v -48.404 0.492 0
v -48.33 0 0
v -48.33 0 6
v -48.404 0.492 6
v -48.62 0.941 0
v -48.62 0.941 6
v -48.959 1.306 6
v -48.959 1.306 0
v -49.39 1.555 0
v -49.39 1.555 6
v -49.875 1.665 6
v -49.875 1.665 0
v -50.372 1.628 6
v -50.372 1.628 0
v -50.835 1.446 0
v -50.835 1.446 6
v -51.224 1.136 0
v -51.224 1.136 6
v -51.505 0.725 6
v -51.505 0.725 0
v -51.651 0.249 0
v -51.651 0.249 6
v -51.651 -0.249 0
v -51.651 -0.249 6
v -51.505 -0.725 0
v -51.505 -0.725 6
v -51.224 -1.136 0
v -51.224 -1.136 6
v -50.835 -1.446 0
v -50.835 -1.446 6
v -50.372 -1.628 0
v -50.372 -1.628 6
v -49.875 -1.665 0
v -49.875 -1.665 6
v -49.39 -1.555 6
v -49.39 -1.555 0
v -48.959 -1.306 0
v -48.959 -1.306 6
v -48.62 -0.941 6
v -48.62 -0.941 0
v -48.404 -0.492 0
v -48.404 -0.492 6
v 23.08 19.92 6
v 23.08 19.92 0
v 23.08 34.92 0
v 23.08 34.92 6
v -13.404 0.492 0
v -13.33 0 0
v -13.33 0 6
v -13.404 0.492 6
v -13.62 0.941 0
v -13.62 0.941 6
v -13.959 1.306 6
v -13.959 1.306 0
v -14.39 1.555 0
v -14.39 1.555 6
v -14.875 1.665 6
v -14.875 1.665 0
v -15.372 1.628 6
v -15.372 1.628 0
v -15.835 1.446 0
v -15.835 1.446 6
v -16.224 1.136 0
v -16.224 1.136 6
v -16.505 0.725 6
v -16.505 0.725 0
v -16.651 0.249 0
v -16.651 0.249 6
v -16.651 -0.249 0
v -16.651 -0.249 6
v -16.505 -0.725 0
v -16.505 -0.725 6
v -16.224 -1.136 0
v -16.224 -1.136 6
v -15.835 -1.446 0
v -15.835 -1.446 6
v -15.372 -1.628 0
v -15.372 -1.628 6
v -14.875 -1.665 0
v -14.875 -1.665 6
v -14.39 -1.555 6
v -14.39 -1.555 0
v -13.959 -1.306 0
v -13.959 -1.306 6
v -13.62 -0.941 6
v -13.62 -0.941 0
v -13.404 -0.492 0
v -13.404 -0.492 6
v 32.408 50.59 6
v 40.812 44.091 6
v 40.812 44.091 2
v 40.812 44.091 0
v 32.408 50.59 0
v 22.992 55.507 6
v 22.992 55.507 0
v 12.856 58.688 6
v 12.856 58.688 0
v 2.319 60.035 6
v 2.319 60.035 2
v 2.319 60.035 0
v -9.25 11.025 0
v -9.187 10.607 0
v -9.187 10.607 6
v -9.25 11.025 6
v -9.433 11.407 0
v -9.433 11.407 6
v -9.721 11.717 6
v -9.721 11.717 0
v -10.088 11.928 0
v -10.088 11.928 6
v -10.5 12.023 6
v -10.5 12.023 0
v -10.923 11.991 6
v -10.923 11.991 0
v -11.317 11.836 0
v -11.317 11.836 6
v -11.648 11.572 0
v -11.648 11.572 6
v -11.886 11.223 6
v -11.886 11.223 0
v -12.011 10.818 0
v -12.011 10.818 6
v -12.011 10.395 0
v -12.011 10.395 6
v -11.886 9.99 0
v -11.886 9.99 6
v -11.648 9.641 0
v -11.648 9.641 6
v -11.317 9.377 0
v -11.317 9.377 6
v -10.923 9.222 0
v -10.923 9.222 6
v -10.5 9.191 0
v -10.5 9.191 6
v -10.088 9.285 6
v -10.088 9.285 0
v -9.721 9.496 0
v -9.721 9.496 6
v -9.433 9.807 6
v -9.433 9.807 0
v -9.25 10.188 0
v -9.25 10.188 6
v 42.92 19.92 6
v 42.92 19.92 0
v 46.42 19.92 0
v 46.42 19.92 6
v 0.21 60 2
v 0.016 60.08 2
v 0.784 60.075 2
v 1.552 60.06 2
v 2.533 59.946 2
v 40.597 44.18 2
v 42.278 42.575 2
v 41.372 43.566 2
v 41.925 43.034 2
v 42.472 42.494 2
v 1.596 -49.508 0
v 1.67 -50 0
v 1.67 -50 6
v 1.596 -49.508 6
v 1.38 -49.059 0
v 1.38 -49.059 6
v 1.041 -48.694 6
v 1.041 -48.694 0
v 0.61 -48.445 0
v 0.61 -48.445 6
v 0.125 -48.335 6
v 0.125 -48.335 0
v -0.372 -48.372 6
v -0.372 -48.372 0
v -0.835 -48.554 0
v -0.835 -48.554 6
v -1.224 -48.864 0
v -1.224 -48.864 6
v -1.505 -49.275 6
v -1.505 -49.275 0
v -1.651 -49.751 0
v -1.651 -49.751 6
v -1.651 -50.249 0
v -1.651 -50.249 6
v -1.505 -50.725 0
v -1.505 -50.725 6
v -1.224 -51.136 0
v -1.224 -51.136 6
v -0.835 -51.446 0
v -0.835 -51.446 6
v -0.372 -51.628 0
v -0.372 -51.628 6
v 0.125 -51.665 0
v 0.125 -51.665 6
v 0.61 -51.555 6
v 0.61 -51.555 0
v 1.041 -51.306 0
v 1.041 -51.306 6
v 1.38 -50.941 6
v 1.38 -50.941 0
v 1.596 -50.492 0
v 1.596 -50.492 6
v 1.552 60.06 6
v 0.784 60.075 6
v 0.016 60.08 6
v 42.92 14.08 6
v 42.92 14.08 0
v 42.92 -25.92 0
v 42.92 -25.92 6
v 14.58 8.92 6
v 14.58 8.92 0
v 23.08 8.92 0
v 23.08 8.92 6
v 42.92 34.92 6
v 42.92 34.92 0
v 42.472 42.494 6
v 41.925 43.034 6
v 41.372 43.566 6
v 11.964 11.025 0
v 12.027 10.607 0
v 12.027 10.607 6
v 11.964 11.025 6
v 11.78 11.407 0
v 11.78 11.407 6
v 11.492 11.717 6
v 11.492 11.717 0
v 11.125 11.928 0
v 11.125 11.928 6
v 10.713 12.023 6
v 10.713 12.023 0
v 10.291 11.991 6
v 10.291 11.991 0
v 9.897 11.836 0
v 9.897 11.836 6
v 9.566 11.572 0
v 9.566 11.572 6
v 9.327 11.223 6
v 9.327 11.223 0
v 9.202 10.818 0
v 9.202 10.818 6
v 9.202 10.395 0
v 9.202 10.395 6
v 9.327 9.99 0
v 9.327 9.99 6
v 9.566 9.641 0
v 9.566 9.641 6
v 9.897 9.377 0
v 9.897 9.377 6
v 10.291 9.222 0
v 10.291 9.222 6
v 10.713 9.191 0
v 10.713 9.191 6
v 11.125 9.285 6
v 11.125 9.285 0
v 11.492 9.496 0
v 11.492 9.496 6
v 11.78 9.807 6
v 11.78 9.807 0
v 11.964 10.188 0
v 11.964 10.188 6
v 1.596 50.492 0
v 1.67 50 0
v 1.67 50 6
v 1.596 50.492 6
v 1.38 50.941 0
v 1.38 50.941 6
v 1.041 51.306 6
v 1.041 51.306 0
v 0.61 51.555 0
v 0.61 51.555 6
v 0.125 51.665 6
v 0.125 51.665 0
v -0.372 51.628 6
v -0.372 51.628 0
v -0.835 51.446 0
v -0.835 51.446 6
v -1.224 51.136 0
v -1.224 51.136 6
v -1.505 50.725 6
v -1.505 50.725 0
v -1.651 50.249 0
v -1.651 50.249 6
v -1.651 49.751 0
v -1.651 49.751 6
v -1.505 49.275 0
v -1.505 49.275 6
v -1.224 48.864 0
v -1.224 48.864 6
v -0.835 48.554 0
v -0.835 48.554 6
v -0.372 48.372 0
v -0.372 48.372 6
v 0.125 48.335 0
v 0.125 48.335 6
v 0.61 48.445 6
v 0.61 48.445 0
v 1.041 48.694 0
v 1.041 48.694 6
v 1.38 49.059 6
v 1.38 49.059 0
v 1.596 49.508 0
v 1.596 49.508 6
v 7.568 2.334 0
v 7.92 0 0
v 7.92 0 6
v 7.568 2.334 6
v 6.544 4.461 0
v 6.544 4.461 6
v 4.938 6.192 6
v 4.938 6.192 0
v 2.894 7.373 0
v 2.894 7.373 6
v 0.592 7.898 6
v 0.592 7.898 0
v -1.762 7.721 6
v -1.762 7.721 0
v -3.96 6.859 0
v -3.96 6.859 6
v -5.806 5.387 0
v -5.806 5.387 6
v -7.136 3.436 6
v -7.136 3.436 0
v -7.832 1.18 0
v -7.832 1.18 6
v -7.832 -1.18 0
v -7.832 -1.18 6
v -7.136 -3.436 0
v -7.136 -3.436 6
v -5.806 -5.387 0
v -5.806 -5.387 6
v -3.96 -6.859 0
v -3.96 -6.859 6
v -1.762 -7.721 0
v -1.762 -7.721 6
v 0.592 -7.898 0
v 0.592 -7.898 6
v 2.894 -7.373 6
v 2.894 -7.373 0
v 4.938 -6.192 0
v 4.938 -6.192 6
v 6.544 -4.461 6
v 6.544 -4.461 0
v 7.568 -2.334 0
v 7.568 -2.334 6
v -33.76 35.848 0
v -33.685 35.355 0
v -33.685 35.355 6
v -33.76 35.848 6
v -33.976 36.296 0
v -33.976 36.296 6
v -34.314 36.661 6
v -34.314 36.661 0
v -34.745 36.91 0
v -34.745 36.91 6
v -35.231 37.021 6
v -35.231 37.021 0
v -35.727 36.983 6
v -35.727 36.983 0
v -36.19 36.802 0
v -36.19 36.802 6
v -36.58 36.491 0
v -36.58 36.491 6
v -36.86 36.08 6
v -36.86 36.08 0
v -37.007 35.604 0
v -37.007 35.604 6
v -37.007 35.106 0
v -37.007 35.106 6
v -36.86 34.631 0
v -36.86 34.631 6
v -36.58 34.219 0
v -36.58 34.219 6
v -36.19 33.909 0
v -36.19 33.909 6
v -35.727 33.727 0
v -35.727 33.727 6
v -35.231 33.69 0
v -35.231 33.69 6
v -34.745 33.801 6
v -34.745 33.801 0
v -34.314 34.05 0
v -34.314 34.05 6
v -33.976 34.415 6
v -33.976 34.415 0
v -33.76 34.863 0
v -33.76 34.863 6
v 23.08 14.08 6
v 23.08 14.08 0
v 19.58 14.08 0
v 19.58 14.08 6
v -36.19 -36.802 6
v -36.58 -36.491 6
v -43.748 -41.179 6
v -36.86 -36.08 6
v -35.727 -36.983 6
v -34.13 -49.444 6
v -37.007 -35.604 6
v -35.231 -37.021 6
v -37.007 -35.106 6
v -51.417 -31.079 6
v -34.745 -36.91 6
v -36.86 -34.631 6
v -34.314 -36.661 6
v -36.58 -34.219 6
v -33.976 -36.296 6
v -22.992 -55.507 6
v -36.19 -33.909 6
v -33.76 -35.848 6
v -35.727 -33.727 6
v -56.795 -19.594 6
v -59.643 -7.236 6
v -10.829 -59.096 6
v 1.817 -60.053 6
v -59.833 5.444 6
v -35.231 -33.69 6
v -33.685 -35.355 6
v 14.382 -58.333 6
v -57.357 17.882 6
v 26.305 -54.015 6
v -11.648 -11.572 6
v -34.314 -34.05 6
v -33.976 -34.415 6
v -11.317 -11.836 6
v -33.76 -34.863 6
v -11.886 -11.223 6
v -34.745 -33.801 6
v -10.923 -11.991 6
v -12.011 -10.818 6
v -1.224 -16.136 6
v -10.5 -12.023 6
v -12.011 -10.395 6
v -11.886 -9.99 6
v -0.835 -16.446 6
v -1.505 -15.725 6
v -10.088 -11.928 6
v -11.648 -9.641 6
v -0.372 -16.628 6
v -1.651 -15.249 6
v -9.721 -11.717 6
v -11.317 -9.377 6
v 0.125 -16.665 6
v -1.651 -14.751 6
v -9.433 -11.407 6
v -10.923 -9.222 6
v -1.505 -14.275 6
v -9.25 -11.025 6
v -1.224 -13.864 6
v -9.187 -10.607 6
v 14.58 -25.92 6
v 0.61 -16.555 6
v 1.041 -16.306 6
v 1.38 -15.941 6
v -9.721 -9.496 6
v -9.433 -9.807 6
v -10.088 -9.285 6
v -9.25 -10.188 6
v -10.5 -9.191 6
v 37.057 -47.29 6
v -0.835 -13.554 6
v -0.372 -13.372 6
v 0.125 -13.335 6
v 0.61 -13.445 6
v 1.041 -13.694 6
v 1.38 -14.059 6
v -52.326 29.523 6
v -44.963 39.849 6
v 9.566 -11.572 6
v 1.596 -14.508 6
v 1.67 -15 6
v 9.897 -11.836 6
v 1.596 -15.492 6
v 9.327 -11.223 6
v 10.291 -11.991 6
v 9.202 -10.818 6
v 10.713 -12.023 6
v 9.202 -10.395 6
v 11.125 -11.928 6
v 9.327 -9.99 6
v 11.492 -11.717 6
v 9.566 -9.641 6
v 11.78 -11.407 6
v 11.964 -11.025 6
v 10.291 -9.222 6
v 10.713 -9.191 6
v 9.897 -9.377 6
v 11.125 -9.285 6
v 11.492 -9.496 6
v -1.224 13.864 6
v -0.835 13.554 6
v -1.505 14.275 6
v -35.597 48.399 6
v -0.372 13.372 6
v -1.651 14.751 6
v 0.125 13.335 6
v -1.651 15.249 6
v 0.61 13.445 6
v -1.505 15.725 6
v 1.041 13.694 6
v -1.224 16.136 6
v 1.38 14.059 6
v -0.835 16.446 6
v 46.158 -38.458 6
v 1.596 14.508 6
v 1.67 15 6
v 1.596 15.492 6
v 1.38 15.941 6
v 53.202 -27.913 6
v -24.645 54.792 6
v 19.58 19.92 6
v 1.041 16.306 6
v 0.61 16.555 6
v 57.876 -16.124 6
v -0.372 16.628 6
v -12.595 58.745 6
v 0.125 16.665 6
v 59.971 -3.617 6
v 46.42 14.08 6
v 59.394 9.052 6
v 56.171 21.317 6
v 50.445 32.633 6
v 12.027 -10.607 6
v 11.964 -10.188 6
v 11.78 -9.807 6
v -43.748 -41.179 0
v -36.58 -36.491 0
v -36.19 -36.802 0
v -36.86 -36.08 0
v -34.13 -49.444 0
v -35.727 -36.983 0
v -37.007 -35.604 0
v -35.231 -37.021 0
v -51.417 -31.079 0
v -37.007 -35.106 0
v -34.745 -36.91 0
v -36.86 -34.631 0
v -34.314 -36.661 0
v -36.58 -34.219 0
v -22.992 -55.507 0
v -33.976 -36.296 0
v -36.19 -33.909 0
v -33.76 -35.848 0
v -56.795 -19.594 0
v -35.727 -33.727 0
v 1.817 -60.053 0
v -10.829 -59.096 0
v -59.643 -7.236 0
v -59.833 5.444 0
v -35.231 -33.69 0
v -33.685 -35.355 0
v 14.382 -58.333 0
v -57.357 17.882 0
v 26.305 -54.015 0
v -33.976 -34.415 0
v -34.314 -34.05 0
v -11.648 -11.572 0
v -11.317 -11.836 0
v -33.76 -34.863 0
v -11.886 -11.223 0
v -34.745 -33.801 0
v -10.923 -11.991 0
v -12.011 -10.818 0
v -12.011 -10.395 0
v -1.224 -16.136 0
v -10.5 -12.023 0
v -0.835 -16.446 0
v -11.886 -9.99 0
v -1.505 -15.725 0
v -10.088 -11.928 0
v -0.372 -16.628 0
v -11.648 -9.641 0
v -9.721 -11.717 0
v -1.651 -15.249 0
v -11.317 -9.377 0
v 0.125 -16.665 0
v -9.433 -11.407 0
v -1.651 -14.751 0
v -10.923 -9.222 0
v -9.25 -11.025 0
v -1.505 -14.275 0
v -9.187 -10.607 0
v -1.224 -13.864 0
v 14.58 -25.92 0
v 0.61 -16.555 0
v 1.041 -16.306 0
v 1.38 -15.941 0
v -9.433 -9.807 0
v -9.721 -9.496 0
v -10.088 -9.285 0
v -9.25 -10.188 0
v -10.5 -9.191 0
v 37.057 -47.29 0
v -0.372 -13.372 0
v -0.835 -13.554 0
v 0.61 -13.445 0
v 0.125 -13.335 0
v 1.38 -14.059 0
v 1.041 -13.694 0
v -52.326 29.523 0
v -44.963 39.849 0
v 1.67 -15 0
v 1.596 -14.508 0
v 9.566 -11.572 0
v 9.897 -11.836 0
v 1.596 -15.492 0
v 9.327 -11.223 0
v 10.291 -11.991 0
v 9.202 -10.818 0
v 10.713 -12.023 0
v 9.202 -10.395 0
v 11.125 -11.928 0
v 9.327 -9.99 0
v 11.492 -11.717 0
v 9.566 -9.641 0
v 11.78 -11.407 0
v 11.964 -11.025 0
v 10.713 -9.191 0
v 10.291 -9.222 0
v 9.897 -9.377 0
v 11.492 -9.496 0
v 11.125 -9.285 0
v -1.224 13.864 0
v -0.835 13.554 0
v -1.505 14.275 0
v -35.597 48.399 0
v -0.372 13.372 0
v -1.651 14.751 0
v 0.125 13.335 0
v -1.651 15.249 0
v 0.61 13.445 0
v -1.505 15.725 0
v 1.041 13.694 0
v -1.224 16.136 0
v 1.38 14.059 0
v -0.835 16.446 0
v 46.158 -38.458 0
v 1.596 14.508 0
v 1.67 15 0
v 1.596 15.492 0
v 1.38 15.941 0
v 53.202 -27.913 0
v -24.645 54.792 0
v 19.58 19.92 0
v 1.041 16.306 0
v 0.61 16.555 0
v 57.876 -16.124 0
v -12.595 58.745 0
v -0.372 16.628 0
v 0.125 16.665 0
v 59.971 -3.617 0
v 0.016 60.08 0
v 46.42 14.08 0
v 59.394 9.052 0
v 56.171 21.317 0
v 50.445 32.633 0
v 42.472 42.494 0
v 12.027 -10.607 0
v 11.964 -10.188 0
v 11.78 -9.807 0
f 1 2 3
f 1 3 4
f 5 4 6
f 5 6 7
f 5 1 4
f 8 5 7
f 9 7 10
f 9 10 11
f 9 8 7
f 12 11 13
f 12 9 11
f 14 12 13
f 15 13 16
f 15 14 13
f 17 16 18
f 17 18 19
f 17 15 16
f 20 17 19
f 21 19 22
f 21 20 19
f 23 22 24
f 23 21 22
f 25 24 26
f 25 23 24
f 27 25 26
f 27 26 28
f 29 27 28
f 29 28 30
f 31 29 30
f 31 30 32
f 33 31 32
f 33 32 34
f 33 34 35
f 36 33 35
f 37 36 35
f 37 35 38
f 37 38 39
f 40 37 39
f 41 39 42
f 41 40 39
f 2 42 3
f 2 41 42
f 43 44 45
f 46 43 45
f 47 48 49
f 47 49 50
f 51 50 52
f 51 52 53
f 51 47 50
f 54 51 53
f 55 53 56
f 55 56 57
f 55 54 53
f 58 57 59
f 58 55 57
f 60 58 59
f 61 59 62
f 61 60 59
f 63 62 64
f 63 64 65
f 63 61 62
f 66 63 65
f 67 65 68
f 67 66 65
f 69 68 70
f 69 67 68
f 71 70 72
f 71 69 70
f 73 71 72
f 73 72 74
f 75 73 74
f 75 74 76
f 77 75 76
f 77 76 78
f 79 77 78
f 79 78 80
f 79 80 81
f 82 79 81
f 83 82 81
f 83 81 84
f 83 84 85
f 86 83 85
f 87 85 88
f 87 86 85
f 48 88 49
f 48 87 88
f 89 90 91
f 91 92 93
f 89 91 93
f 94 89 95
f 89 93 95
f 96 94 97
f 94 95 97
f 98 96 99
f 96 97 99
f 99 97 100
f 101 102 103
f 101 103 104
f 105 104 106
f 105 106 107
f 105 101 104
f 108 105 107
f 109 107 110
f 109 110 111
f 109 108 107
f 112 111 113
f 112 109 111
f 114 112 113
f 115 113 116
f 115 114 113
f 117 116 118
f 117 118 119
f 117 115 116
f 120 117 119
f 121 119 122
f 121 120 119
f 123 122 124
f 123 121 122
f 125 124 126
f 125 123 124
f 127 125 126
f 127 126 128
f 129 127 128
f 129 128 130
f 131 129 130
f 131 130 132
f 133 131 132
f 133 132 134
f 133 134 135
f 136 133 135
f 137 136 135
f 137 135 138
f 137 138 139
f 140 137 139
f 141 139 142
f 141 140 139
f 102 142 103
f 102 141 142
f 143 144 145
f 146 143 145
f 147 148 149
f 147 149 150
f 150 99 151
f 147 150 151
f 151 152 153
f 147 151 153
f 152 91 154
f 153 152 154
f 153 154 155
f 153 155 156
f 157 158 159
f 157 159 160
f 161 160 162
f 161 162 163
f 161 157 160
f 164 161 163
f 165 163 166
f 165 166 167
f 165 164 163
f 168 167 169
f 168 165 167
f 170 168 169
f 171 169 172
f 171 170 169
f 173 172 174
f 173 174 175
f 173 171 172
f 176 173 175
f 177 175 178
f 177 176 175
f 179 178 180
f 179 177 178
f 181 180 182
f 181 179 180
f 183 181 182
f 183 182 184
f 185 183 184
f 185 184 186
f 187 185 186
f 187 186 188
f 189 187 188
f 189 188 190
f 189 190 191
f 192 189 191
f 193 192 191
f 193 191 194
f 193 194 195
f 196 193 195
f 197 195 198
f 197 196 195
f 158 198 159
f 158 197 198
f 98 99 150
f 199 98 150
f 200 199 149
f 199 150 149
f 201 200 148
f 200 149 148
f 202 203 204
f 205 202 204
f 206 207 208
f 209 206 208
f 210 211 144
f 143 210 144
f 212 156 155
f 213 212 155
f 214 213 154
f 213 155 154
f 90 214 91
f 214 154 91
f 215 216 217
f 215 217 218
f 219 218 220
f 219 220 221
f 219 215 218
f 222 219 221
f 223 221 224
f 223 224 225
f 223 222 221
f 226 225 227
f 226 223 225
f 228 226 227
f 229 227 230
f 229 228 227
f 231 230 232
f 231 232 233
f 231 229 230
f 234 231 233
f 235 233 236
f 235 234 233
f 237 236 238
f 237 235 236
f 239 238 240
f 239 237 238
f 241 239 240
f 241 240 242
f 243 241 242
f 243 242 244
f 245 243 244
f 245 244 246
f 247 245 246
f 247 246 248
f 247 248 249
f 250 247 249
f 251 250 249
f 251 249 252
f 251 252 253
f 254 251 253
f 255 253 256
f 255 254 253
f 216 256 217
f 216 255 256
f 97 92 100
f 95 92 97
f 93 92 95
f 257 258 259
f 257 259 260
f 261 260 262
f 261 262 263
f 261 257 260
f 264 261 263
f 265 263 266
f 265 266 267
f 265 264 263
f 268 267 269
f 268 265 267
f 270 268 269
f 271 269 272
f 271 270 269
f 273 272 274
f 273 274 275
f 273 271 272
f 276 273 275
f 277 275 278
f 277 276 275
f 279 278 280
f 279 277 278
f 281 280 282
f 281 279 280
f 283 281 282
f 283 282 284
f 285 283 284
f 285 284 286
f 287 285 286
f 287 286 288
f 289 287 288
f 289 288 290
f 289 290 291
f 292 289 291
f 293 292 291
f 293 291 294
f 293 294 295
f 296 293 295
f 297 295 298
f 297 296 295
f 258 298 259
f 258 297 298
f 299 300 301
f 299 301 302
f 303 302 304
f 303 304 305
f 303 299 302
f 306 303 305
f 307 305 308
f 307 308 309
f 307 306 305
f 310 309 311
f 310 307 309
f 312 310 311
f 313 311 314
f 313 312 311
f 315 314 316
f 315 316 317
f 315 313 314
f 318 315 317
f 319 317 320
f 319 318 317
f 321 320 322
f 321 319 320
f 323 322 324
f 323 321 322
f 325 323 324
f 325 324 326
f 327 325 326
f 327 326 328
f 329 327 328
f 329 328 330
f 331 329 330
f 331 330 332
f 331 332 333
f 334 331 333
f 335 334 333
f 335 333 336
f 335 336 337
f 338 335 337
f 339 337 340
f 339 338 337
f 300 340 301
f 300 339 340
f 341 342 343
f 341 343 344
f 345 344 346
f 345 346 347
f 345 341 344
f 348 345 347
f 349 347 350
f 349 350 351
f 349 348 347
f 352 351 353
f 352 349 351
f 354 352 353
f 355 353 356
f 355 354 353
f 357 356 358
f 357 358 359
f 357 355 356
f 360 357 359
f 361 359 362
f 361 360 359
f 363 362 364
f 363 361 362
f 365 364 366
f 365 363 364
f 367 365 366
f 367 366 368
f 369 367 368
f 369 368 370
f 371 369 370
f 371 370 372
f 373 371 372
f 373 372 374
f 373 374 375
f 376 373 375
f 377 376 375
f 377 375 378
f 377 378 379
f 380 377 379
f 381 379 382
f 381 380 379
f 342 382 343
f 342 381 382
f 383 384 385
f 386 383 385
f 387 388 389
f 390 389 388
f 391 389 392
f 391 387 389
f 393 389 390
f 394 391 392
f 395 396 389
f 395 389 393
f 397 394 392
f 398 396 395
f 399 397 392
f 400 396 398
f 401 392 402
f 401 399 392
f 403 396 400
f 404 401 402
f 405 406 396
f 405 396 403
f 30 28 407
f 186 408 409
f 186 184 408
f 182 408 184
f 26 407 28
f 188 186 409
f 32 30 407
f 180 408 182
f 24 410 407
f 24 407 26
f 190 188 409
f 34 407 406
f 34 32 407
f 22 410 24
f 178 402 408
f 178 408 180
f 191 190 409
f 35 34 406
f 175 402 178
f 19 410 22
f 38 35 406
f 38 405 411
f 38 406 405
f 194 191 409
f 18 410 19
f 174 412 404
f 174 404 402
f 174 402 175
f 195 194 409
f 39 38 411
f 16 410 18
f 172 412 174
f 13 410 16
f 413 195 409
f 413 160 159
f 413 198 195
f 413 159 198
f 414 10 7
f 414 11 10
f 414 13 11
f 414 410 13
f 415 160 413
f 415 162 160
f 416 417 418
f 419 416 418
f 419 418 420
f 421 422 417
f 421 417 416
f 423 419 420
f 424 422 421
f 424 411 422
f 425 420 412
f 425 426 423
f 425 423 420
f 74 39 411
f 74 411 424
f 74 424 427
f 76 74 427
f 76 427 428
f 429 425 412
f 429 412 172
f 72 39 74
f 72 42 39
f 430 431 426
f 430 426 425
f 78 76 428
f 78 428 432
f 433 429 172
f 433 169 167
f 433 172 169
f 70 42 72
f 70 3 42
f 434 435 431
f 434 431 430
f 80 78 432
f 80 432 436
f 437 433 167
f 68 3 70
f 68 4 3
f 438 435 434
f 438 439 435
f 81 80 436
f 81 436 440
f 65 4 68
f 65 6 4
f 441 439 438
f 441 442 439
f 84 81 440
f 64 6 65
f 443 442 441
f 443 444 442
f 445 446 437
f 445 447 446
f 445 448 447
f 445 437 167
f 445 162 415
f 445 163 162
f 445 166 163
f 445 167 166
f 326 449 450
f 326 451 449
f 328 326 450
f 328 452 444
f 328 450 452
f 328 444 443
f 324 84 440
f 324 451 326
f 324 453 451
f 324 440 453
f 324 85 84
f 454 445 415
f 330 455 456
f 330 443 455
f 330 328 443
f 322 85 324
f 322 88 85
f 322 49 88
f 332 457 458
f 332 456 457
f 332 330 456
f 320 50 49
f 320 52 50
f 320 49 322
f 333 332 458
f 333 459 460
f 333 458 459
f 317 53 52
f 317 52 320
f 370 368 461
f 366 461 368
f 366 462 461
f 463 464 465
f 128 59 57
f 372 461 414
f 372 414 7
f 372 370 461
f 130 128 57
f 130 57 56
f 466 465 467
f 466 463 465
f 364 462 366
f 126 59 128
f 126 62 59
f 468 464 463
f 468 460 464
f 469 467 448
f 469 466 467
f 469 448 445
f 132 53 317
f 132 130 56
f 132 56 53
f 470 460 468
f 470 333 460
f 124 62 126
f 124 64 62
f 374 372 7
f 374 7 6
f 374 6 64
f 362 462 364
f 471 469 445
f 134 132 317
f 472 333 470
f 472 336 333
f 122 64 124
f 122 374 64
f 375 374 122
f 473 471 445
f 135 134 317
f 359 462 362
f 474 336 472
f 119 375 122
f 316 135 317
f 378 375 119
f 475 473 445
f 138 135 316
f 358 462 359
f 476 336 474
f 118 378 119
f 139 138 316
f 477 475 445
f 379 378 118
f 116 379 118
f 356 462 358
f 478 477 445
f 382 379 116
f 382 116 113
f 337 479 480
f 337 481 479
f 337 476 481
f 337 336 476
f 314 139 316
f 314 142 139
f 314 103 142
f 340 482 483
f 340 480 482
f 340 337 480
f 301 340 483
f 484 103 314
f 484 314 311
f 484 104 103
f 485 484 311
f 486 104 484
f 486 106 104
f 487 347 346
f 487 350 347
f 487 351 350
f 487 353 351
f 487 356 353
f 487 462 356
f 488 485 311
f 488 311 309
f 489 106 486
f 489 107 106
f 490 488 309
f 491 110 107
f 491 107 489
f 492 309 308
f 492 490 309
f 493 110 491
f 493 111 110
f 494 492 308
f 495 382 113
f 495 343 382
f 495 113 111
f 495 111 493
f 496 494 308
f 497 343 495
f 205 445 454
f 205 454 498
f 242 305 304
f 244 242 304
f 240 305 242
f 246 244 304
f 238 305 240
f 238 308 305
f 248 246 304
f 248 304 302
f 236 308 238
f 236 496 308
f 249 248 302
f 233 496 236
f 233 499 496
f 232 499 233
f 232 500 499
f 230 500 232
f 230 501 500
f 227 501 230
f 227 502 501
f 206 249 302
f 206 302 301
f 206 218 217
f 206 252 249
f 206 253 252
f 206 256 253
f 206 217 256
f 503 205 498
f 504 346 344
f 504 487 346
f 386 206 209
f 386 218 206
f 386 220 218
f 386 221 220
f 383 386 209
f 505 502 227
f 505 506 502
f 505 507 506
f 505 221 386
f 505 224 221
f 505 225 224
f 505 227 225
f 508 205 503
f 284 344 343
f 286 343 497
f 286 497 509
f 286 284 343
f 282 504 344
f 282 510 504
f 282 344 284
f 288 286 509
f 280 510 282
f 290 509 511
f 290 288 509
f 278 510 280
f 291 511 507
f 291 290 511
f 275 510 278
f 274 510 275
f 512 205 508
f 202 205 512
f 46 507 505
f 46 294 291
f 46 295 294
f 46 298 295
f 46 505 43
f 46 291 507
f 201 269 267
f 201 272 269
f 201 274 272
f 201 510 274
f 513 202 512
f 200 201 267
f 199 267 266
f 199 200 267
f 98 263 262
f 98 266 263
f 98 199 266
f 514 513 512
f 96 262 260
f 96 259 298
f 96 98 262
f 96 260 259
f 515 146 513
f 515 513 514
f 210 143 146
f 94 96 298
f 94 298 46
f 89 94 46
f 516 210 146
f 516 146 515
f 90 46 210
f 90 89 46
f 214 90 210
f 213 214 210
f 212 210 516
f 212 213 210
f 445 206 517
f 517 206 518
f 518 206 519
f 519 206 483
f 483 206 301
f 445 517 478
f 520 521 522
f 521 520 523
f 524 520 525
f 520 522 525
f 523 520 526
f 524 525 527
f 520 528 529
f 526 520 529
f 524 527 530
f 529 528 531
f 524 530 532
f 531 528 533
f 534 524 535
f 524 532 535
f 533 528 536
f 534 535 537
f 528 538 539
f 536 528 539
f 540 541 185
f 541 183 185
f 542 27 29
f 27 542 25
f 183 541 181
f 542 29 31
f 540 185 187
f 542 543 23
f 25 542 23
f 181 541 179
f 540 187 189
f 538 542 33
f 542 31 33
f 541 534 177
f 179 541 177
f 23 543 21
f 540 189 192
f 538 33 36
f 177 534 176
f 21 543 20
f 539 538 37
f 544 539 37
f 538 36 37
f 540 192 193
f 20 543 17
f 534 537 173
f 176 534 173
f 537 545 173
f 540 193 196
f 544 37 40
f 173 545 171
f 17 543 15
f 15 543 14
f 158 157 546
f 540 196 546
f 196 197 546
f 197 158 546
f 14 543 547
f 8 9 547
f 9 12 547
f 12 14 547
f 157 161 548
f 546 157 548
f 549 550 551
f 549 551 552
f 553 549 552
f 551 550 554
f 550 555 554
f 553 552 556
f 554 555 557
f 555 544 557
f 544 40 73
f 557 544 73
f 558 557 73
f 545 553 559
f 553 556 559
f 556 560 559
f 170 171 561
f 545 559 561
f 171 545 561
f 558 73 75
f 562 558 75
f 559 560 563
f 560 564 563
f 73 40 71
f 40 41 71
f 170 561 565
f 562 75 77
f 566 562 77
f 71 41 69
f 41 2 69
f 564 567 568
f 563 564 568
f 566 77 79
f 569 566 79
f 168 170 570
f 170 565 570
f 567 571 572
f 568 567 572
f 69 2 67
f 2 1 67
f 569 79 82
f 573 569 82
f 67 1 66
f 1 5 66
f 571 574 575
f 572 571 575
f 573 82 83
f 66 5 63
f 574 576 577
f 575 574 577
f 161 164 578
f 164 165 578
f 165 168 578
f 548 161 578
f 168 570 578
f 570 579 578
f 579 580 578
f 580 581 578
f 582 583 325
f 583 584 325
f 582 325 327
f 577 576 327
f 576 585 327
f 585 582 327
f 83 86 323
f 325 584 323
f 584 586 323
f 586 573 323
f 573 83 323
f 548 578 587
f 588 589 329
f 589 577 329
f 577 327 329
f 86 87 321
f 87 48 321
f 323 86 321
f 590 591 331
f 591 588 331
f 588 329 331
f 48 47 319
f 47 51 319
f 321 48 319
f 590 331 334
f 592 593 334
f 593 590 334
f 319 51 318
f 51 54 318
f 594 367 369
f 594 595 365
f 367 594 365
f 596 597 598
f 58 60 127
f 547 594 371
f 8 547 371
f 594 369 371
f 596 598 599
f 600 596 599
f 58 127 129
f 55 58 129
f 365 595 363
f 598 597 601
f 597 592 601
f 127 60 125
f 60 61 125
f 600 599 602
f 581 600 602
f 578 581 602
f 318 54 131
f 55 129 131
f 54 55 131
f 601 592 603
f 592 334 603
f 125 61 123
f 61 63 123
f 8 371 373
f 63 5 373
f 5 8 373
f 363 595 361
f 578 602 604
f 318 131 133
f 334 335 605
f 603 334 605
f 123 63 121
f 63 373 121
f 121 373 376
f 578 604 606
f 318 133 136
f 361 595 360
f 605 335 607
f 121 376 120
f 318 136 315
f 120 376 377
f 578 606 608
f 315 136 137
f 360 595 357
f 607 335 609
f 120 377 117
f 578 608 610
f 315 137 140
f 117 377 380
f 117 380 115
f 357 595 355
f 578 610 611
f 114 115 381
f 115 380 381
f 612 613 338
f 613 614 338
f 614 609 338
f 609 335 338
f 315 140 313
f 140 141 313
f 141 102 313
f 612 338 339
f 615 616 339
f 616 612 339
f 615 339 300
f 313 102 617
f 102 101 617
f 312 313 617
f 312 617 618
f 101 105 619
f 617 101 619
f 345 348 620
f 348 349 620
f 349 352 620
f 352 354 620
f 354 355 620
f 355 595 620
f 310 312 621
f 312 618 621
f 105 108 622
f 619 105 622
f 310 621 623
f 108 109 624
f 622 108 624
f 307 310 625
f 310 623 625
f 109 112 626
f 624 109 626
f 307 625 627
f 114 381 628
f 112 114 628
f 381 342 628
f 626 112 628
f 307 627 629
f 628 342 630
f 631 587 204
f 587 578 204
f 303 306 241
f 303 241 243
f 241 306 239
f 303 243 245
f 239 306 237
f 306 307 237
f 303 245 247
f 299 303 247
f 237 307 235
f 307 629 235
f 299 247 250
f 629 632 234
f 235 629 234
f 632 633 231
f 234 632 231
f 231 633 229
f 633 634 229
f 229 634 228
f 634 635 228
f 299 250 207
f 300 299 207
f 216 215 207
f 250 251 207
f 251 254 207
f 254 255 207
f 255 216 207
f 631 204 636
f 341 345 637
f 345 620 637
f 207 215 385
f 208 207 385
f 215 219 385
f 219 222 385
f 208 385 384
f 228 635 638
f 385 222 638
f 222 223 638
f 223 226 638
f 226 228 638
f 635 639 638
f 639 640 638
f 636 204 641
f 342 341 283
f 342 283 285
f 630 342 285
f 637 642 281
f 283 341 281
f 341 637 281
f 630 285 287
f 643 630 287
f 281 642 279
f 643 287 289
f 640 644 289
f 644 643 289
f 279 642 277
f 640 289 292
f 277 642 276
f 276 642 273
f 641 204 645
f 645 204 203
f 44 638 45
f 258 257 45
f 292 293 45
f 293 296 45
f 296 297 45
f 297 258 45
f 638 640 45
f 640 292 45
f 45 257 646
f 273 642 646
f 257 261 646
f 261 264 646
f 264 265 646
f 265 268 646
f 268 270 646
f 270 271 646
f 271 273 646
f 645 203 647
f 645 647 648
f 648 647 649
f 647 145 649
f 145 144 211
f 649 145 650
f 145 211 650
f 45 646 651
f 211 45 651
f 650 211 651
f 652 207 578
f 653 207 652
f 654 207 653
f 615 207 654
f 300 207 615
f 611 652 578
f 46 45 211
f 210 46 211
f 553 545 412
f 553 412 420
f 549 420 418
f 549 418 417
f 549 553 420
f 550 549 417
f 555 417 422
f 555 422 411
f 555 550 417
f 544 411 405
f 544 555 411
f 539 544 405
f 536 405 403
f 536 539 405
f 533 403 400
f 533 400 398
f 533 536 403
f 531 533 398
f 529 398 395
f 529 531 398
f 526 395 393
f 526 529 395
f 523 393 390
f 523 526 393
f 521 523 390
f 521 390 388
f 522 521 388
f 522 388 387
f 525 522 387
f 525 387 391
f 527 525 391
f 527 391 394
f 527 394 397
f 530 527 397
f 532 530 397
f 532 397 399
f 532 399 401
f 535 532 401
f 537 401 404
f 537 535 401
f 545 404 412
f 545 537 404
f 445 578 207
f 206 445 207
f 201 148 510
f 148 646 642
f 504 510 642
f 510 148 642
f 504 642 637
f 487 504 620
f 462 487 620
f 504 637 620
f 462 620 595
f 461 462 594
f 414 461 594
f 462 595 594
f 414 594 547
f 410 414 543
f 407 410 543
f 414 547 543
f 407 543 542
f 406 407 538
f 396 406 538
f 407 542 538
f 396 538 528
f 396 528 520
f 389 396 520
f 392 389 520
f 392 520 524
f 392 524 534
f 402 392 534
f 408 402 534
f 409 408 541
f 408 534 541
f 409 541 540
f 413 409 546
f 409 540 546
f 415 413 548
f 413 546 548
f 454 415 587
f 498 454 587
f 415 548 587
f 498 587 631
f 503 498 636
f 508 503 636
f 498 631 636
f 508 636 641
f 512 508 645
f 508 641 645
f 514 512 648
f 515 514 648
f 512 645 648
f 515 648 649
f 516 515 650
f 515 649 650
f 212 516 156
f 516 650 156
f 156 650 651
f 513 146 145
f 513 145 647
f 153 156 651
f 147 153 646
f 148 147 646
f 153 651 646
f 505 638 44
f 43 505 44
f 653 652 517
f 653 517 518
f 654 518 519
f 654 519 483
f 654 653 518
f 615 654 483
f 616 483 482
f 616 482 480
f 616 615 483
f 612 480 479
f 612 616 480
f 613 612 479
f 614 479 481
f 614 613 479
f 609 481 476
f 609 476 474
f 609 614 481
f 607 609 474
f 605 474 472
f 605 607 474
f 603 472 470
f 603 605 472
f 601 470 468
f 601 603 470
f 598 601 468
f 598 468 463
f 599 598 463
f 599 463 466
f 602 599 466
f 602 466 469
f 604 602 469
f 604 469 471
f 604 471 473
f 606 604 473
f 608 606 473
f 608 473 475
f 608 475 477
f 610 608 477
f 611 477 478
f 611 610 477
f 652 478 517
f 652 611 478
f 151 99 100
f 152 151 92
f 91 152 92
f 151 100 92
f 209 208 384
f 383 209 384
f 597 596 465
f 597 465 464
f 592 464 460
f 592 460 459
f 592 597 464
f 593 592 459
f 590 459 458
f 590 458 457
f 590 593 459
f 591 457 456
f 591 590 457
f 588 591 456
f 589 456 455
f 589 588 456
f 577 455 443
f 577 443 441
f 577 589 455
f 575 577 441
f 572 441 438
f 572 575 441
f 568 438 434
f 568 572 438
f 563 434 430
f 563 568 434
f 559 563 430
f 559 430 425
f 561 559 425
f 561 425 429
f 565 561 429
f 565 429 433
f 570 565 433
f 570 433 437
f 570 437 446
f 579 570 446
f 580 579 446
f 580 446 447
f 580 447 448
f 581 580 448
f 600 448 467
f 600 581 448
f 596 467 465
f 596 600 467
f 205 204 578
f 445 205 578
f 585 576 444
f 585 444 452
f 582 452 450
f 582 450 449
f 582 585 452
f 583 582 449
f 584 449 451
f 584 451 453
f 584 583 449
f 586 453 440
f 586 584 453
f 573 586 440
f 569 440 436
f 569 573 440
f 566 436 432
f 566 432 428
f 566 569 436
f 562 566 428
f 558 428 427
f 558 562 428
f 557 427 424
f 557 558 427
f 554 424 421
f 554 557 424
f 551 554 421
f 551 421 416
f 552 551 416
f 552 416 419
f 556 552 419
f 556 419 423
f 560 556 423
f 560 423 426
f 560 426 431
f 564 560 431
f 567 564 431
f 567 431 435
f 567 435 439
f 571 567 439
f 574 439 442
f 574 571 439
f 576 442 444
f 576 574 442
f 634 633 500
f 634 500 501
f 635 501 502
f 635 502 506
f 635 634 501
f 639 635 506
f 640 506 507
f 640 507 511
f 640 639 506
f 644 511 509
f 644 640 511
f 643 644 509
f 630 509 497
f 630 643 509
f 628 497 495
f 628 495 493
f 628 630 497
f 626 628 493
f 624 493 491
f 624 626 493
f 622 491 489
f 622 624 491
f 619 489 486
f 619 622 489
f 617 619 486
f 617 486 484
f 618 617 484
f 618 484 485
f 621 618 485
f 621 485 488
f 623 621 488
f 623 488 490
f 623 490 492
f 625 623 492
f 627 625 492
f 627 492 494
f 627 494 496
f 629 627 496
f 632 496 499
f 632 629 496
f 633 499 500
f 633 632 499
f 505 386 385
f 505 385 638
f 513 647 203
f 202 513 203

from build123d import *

# Parameters (mm, degrees)
SKETCH1_R              = 60
SKETCH1_R_2            = 8
SKETCH1_R_3            = 1.75
SKETCH1_R_4            = 1.5
BOSS_EXTRUDE1_DEPTH    = 6
CUT_EXTRUDE6_DEPTH     = 86.064681273
CUT_EXTRUDE7_DEPTH     = 2
MOVE_FACE2_OUTLINE_R   = 8
MOVE_FACE2_OUTLINE_R_2 = 7.92
MOVE_FACE2_OUTLINE_R_3 = 1.75
MOVE_FACE2_OUTLINE_R_4 = 1.67
MOVE_FACE2_OUTLINE_R_5 = 1.5
MOVE_FACE2_OUTLINE_R_6 = 1.42
MOVE_FACE2_DEPTH       = 6
MOVE_START             = 2
MOVE_FACE2_2_DEPTH     = 4


# Read off the part's stored shape, not the designer's step: Move Face2
with BuildPart() as part:
    # Sketch1 → Boss-Extrude1 (new body)
    with BuildSketch(Plane.XY):
        Circle(SKETCH1_R)
        Circle(SKETCH1_R_2, mode=Mode.SUBTRACT)
        with Locations((0, -15)):
            Circle(SKETCH1_R_3, mode=Mode.SUBTRACT)
        with Locations((10.606601718, -10.606601718)):
            Circle(SKETCH1_R_4, mode=Mode.SUBTRACT)
        with Locations((0, -50)):
            Circle(SKETCH1_R_3, mode=Mode.SUBTRACT)
        with Locations((-15, 0)):
            Circle(SKETCH1_R_3, mode=Mode.SUBTRACT)
        with Locations((-10.606601718, -10.606601718)):
            Circle(SKETCH1_R_4, mode=Mode.SUBTRACT)
        with Locations((0, 15)):
            Circle(SKETCH1_R_3, mode=Mode.SUBTRACT)
        with Locations((-10.606601718, 10.606601718)):
            Circle(SKETCH1_R_4, mode=Mode.SUBTRACT)
        with Locations((10.606601718, 10.606601718)):
            Circle(SKETCH1_R_4, mode=Mode.SUBTRACT)
        with Locations((-35.355339059, -35.355339059)):
            Circle(SKETCH1_R_3, mode=Mode.SUBTRACT)
        with Locations((-35.355339059, 35.355339059)):
            Circle(SKETCH1_R_3, mode=Mode.SUBTRACT)
        with Locations((-50, 0)):
            Circle(SKETCH1_R_3, mode=Mode.SUBTRACT)
        with Locations((0, 50)):
            Circle(SKETCH1_R_3, mode=Mode.SUBTRACT)
    extrude(amount=BOSS_EXTRUDE1_DEPTH)

    # Sketch7 → Cut-Extrude6 (cut, through all)
    with BuildSketch(Plane(origin=(0, 0, 0), x_dir=(-1, 0, 0), z_dir=(0, 0, -1))):
        Polygon((-43, -26), (-23, -26), (-14.5, -26), (-14.5, 9), (-23, 9), (-23, 14), (-19.5, 14), (-19.5, 20), (-23, 20), (-23, 35), (-43, 35), (-43, 20), (-46.5, 20), (-46.5, 14), (-43, 14), align=None)
    extrude(amount=-CUT_EXTRUDE6_DEPTH, mode=Mode.SUBTRACT)

    # Sketch8 → Cut-Extrude7 (cut)
    with BuildSketch(Plane(origin=(0, 0, 0), x_dir=(-1, 0, 0), z_dir=(0, 0, -1))):
        Polygon((-42.426406871, 42.426406871), (0, 60), (-0.316144007, 60.951441065), (-42.742550878, 43.377847936), align=None)
    extrude(amount=-CUT_EXTRUDE7_DEPTH, mode=Mode.SUBTRACT)

    # Move Face2 outline → Move Face2 (add)
    # profile 1 of 16: a face of its own
    with BuildSketch(Plane.XY):
        with BuildLine():
            ThreePointArc((0.01591808, 60.079997891), (-22.991620616, -55.506682313), (42.47171814, 42.494229705))
            Line((42.47171814, 42.494229705), (0.01591808, 60.079997891))
        make_face()
        with BuildLine():
            Line((0, 60), (42.426406871, 42.426406871))
            ThreePointArc((42.426406871, 42.426406871), (-22.961005942, -55.432771951), (0, 60))
        make_face(mode=Mode.SUBTRACT)
    # profile 2 of 16: a face of its own
    with BuildSketch(Plane.XY):
        with BuildLine():
            ThreePointArc((40.811514416, 44.091118052), (22.991620617, 55.506682313), (2.319029971, 60.035227159))
            Line((2.319029971, 60.035227159), (40.811514416, 44.091118052))
        make_face()
        with BuildLine():
            ThreePointArc((2.767270729, 59.936151134), (22.961005942, 55.432771951), (40.424503007, 44.338014803))
            Line((40.424503007, 44.338014803), (2.767270729, 59.936151134))
        make_face(mode=Mode.SUBTRACT)
    # profile 3 of 16: a face of its own
    with BuildSketch(Plane.XY):
        Circle(MOVE_FACE2_OUTLINE_R)
        Circle(MOVE_FACE2_OUTLINE_R_2, mode=Mode.SUBTRACT)
    # profile 4 of 16: a face of its own
    with BuildSketch(Plane.XY):
        with Locations((0, -15)):
            Circle(MOVE_FACE2_OUTLINE_R_3)
        with Locations((0, -15)):
            Circle(MOVE_FACE2_OUTLINE_R_4, mode=Mode.SUBTRACT)
    # profile 5 of 16: a face of its own
    with BuildSketch(Plane.XY):
        with Locations((10.606601718, -10.606601718)):
            Circle(MOVE_FACE2_OUTLINE_R_5)
        with Locations((10.606601718, -10.606601718)):
            Circle(MOVE_FACE2_OUTLINE_R_6, mode=Mode.SUBTRACT)
    # profile 6 of 16: a face of its own
    with BuildSketch(Plane.XY):
        with Locations((0, -50)):
            Circle(MOVE_FACE2_OUTLINE_R_3)
        with Locations((0, -50)):
            Circle(MOVE_FACE2_OUTLINE_R_4, mode=Mode.SUBTRACT)
    # profile 7 of 16: a face of its own
    with BuildSketch(Plane.XY):
        with Locations((-35.355339059, -35.355339059)):
            Circle(MOVE_FACE2_OUTLINE_R_3)
        with Locations((-35.355339059, -35.355339059)):
            Circle(MOVE_FACE2_OUTLINE_R_4, mode=Mode.SUBTRACT)
    # profile 8 of 16: a face of its own
    with BuildSketch(Plane.XY):
        with Locations((-15, 0)):
            Circle(MOVE_FACE2_OUTLINE_R_3)
        with Locations((-15, 0)):
            Circle(MOVE_FACE2_OUTLINE_R_4, mode=Mode.SUBTRACT)
    # profile 9 of 16: a face of its own
    with BuildSketch(Plane.XY):
        with Locations((-10.606601718, -10.606601718)):
            Circle(MOVE_FACE2_OUTLINE_R_5)
        with Locations((-10.606601718, -10.606601718)):
            Circle(MOVE_FACE2_OUTLINE_R_6, mode=Mode.SUBTRACT)
    # profile 10 of 16: a face of its own
    with BuildSketch(Plane.XY):
        with Locations((0, 15)):
            Circle(MOVE_FACE2_OUTLINE_R_3)
        with Locations((0, 15)):
            Circle(MOVE_FACE2_OUTLINE_R_4, mode=Mode.SUBTRACT)
    # profile 11 of 16: a face of its own
    with BuildSketch(Plane.XY):
        with Locations((-10.606601718, 10.606601718)):
            Circle(MOVE_FACE2_OUTLINE_R_5)
        with Locations((-10.606601718, 10.606601718)):
            Circle(MOVE_FACE2_OUTLINE_R_6, mode=Mode.SUBTRACT)
    # profile 12 of 16: a face of its own
    with BuildSketch(Plane.XY):
        with Locations((10.606601718, 10.606601718)):
            Circle(MOVE_FACE2_OUTLINE_R_5)
        with Locations((10.606601718, 10.606601718)):
            Circle(MOVE_FACE2_OUTLINE_R_6, mode=Mode.SUBTRACT)
    # profile 13 of 16: a face of its own
    with BuildSketch(Plane.XY):
        with Locations((-50, 0)):
            Circle(MOVE_FACE2_OUTLINE_R_3)
        with Locations((-50, 0)):
            Circle(MOVE_FACE2_OUTLINE_R_4, mode=Mode.SUBTRACT)
    # profile 14 of 16: a face of its own
    with BuildSketch(Plane.XY):
        with Locations((-35.355339059, 35.355339059)):
            Circle(MOVE_FACE2_OUTLINE_R_3)
        with Locations((-35.355339059, 35.355339059)):
            Circle(MOVE_FACE2_OUTLINE_R_4, mode=Mode.SUBTRACT)
    # profile 15 of 16: a face of its own
    with BuildSketch(Plane.XY):
        with Locations((0, 50)):
            Circle(MOVE_FACE2_OUTLINE_R_3)
        with Locations((0, 50)):
            Circle(MOVE_FACE2_OUTLINE_R_4, mode=Mode.SUBTRACT)
    # profile 16 of 16: a face of its own
    with BuildSketch(Plane.XY):
        Polygon((14.5, -26), (43, -26), (43, 14), (46.5, 14), (46.5, 20), (43, 20), (43, 35), (23, 35), (23, 20), (19.5, 20), (19.5, 14), (23, 14), (23, 9), (14.5, 9), align=None)
        Polygon((42.92, 14.08), (42.92, -25.92), (14.58, -25.92), (14.58, 8.92), (23.08, 8.92), (23.08, 14.08), (19.58, 14.08), (19.58, 19.92), (23.08, 19.92), (23.08, 34.92), (42.92, 34.92), (42.92, 19.92), (46.42, 19.92), (46.42, 14.08), align=None, mode=Mode.SUBTRACT)
    extrude(amount=MOVE_FACE2_DEPTH)

    # Move Face2 2 outline → Move Face2 2 (add)
    with BuildSketch(Plane.XY.offset(MOVE_START)):
        with BuildLine():
            Line((42.277699454, 42.574594876), (42.47171814, 42.494229705))
            ThreePointArc((42.47171814, 42.494229705), (41.649270334, 43.300631412), (40.811514416, 44.091118052))
            Line((40.811514416, 44.091118052), (40.597304781, 44.179846588))
            ThreePointArc((40.597304781, 44.179846588), (41.44527464, 43.385357092), (42.277699454, 42.574594876))
        make_face()
        with BuildLine():
            ThreePointArc((2.319029971, 60.035227159), (1.167688616, 60.068651585), (0.01591808, 60.079997891))
            Line((0.01591808, 60.079997891), (0.209936765, 59.99963272))
            ThreePointArc((0.209936765, 59.99963272), (1.371845458, 59.98431495), (2.533239607, 59.946498622))
            Line((2.533239607, 59.946498622), (2.319029971, 60.035227159))
        make_face()
    extrude(amount=MOVE_FACE2_2_DEPTH)


solid = part.part
